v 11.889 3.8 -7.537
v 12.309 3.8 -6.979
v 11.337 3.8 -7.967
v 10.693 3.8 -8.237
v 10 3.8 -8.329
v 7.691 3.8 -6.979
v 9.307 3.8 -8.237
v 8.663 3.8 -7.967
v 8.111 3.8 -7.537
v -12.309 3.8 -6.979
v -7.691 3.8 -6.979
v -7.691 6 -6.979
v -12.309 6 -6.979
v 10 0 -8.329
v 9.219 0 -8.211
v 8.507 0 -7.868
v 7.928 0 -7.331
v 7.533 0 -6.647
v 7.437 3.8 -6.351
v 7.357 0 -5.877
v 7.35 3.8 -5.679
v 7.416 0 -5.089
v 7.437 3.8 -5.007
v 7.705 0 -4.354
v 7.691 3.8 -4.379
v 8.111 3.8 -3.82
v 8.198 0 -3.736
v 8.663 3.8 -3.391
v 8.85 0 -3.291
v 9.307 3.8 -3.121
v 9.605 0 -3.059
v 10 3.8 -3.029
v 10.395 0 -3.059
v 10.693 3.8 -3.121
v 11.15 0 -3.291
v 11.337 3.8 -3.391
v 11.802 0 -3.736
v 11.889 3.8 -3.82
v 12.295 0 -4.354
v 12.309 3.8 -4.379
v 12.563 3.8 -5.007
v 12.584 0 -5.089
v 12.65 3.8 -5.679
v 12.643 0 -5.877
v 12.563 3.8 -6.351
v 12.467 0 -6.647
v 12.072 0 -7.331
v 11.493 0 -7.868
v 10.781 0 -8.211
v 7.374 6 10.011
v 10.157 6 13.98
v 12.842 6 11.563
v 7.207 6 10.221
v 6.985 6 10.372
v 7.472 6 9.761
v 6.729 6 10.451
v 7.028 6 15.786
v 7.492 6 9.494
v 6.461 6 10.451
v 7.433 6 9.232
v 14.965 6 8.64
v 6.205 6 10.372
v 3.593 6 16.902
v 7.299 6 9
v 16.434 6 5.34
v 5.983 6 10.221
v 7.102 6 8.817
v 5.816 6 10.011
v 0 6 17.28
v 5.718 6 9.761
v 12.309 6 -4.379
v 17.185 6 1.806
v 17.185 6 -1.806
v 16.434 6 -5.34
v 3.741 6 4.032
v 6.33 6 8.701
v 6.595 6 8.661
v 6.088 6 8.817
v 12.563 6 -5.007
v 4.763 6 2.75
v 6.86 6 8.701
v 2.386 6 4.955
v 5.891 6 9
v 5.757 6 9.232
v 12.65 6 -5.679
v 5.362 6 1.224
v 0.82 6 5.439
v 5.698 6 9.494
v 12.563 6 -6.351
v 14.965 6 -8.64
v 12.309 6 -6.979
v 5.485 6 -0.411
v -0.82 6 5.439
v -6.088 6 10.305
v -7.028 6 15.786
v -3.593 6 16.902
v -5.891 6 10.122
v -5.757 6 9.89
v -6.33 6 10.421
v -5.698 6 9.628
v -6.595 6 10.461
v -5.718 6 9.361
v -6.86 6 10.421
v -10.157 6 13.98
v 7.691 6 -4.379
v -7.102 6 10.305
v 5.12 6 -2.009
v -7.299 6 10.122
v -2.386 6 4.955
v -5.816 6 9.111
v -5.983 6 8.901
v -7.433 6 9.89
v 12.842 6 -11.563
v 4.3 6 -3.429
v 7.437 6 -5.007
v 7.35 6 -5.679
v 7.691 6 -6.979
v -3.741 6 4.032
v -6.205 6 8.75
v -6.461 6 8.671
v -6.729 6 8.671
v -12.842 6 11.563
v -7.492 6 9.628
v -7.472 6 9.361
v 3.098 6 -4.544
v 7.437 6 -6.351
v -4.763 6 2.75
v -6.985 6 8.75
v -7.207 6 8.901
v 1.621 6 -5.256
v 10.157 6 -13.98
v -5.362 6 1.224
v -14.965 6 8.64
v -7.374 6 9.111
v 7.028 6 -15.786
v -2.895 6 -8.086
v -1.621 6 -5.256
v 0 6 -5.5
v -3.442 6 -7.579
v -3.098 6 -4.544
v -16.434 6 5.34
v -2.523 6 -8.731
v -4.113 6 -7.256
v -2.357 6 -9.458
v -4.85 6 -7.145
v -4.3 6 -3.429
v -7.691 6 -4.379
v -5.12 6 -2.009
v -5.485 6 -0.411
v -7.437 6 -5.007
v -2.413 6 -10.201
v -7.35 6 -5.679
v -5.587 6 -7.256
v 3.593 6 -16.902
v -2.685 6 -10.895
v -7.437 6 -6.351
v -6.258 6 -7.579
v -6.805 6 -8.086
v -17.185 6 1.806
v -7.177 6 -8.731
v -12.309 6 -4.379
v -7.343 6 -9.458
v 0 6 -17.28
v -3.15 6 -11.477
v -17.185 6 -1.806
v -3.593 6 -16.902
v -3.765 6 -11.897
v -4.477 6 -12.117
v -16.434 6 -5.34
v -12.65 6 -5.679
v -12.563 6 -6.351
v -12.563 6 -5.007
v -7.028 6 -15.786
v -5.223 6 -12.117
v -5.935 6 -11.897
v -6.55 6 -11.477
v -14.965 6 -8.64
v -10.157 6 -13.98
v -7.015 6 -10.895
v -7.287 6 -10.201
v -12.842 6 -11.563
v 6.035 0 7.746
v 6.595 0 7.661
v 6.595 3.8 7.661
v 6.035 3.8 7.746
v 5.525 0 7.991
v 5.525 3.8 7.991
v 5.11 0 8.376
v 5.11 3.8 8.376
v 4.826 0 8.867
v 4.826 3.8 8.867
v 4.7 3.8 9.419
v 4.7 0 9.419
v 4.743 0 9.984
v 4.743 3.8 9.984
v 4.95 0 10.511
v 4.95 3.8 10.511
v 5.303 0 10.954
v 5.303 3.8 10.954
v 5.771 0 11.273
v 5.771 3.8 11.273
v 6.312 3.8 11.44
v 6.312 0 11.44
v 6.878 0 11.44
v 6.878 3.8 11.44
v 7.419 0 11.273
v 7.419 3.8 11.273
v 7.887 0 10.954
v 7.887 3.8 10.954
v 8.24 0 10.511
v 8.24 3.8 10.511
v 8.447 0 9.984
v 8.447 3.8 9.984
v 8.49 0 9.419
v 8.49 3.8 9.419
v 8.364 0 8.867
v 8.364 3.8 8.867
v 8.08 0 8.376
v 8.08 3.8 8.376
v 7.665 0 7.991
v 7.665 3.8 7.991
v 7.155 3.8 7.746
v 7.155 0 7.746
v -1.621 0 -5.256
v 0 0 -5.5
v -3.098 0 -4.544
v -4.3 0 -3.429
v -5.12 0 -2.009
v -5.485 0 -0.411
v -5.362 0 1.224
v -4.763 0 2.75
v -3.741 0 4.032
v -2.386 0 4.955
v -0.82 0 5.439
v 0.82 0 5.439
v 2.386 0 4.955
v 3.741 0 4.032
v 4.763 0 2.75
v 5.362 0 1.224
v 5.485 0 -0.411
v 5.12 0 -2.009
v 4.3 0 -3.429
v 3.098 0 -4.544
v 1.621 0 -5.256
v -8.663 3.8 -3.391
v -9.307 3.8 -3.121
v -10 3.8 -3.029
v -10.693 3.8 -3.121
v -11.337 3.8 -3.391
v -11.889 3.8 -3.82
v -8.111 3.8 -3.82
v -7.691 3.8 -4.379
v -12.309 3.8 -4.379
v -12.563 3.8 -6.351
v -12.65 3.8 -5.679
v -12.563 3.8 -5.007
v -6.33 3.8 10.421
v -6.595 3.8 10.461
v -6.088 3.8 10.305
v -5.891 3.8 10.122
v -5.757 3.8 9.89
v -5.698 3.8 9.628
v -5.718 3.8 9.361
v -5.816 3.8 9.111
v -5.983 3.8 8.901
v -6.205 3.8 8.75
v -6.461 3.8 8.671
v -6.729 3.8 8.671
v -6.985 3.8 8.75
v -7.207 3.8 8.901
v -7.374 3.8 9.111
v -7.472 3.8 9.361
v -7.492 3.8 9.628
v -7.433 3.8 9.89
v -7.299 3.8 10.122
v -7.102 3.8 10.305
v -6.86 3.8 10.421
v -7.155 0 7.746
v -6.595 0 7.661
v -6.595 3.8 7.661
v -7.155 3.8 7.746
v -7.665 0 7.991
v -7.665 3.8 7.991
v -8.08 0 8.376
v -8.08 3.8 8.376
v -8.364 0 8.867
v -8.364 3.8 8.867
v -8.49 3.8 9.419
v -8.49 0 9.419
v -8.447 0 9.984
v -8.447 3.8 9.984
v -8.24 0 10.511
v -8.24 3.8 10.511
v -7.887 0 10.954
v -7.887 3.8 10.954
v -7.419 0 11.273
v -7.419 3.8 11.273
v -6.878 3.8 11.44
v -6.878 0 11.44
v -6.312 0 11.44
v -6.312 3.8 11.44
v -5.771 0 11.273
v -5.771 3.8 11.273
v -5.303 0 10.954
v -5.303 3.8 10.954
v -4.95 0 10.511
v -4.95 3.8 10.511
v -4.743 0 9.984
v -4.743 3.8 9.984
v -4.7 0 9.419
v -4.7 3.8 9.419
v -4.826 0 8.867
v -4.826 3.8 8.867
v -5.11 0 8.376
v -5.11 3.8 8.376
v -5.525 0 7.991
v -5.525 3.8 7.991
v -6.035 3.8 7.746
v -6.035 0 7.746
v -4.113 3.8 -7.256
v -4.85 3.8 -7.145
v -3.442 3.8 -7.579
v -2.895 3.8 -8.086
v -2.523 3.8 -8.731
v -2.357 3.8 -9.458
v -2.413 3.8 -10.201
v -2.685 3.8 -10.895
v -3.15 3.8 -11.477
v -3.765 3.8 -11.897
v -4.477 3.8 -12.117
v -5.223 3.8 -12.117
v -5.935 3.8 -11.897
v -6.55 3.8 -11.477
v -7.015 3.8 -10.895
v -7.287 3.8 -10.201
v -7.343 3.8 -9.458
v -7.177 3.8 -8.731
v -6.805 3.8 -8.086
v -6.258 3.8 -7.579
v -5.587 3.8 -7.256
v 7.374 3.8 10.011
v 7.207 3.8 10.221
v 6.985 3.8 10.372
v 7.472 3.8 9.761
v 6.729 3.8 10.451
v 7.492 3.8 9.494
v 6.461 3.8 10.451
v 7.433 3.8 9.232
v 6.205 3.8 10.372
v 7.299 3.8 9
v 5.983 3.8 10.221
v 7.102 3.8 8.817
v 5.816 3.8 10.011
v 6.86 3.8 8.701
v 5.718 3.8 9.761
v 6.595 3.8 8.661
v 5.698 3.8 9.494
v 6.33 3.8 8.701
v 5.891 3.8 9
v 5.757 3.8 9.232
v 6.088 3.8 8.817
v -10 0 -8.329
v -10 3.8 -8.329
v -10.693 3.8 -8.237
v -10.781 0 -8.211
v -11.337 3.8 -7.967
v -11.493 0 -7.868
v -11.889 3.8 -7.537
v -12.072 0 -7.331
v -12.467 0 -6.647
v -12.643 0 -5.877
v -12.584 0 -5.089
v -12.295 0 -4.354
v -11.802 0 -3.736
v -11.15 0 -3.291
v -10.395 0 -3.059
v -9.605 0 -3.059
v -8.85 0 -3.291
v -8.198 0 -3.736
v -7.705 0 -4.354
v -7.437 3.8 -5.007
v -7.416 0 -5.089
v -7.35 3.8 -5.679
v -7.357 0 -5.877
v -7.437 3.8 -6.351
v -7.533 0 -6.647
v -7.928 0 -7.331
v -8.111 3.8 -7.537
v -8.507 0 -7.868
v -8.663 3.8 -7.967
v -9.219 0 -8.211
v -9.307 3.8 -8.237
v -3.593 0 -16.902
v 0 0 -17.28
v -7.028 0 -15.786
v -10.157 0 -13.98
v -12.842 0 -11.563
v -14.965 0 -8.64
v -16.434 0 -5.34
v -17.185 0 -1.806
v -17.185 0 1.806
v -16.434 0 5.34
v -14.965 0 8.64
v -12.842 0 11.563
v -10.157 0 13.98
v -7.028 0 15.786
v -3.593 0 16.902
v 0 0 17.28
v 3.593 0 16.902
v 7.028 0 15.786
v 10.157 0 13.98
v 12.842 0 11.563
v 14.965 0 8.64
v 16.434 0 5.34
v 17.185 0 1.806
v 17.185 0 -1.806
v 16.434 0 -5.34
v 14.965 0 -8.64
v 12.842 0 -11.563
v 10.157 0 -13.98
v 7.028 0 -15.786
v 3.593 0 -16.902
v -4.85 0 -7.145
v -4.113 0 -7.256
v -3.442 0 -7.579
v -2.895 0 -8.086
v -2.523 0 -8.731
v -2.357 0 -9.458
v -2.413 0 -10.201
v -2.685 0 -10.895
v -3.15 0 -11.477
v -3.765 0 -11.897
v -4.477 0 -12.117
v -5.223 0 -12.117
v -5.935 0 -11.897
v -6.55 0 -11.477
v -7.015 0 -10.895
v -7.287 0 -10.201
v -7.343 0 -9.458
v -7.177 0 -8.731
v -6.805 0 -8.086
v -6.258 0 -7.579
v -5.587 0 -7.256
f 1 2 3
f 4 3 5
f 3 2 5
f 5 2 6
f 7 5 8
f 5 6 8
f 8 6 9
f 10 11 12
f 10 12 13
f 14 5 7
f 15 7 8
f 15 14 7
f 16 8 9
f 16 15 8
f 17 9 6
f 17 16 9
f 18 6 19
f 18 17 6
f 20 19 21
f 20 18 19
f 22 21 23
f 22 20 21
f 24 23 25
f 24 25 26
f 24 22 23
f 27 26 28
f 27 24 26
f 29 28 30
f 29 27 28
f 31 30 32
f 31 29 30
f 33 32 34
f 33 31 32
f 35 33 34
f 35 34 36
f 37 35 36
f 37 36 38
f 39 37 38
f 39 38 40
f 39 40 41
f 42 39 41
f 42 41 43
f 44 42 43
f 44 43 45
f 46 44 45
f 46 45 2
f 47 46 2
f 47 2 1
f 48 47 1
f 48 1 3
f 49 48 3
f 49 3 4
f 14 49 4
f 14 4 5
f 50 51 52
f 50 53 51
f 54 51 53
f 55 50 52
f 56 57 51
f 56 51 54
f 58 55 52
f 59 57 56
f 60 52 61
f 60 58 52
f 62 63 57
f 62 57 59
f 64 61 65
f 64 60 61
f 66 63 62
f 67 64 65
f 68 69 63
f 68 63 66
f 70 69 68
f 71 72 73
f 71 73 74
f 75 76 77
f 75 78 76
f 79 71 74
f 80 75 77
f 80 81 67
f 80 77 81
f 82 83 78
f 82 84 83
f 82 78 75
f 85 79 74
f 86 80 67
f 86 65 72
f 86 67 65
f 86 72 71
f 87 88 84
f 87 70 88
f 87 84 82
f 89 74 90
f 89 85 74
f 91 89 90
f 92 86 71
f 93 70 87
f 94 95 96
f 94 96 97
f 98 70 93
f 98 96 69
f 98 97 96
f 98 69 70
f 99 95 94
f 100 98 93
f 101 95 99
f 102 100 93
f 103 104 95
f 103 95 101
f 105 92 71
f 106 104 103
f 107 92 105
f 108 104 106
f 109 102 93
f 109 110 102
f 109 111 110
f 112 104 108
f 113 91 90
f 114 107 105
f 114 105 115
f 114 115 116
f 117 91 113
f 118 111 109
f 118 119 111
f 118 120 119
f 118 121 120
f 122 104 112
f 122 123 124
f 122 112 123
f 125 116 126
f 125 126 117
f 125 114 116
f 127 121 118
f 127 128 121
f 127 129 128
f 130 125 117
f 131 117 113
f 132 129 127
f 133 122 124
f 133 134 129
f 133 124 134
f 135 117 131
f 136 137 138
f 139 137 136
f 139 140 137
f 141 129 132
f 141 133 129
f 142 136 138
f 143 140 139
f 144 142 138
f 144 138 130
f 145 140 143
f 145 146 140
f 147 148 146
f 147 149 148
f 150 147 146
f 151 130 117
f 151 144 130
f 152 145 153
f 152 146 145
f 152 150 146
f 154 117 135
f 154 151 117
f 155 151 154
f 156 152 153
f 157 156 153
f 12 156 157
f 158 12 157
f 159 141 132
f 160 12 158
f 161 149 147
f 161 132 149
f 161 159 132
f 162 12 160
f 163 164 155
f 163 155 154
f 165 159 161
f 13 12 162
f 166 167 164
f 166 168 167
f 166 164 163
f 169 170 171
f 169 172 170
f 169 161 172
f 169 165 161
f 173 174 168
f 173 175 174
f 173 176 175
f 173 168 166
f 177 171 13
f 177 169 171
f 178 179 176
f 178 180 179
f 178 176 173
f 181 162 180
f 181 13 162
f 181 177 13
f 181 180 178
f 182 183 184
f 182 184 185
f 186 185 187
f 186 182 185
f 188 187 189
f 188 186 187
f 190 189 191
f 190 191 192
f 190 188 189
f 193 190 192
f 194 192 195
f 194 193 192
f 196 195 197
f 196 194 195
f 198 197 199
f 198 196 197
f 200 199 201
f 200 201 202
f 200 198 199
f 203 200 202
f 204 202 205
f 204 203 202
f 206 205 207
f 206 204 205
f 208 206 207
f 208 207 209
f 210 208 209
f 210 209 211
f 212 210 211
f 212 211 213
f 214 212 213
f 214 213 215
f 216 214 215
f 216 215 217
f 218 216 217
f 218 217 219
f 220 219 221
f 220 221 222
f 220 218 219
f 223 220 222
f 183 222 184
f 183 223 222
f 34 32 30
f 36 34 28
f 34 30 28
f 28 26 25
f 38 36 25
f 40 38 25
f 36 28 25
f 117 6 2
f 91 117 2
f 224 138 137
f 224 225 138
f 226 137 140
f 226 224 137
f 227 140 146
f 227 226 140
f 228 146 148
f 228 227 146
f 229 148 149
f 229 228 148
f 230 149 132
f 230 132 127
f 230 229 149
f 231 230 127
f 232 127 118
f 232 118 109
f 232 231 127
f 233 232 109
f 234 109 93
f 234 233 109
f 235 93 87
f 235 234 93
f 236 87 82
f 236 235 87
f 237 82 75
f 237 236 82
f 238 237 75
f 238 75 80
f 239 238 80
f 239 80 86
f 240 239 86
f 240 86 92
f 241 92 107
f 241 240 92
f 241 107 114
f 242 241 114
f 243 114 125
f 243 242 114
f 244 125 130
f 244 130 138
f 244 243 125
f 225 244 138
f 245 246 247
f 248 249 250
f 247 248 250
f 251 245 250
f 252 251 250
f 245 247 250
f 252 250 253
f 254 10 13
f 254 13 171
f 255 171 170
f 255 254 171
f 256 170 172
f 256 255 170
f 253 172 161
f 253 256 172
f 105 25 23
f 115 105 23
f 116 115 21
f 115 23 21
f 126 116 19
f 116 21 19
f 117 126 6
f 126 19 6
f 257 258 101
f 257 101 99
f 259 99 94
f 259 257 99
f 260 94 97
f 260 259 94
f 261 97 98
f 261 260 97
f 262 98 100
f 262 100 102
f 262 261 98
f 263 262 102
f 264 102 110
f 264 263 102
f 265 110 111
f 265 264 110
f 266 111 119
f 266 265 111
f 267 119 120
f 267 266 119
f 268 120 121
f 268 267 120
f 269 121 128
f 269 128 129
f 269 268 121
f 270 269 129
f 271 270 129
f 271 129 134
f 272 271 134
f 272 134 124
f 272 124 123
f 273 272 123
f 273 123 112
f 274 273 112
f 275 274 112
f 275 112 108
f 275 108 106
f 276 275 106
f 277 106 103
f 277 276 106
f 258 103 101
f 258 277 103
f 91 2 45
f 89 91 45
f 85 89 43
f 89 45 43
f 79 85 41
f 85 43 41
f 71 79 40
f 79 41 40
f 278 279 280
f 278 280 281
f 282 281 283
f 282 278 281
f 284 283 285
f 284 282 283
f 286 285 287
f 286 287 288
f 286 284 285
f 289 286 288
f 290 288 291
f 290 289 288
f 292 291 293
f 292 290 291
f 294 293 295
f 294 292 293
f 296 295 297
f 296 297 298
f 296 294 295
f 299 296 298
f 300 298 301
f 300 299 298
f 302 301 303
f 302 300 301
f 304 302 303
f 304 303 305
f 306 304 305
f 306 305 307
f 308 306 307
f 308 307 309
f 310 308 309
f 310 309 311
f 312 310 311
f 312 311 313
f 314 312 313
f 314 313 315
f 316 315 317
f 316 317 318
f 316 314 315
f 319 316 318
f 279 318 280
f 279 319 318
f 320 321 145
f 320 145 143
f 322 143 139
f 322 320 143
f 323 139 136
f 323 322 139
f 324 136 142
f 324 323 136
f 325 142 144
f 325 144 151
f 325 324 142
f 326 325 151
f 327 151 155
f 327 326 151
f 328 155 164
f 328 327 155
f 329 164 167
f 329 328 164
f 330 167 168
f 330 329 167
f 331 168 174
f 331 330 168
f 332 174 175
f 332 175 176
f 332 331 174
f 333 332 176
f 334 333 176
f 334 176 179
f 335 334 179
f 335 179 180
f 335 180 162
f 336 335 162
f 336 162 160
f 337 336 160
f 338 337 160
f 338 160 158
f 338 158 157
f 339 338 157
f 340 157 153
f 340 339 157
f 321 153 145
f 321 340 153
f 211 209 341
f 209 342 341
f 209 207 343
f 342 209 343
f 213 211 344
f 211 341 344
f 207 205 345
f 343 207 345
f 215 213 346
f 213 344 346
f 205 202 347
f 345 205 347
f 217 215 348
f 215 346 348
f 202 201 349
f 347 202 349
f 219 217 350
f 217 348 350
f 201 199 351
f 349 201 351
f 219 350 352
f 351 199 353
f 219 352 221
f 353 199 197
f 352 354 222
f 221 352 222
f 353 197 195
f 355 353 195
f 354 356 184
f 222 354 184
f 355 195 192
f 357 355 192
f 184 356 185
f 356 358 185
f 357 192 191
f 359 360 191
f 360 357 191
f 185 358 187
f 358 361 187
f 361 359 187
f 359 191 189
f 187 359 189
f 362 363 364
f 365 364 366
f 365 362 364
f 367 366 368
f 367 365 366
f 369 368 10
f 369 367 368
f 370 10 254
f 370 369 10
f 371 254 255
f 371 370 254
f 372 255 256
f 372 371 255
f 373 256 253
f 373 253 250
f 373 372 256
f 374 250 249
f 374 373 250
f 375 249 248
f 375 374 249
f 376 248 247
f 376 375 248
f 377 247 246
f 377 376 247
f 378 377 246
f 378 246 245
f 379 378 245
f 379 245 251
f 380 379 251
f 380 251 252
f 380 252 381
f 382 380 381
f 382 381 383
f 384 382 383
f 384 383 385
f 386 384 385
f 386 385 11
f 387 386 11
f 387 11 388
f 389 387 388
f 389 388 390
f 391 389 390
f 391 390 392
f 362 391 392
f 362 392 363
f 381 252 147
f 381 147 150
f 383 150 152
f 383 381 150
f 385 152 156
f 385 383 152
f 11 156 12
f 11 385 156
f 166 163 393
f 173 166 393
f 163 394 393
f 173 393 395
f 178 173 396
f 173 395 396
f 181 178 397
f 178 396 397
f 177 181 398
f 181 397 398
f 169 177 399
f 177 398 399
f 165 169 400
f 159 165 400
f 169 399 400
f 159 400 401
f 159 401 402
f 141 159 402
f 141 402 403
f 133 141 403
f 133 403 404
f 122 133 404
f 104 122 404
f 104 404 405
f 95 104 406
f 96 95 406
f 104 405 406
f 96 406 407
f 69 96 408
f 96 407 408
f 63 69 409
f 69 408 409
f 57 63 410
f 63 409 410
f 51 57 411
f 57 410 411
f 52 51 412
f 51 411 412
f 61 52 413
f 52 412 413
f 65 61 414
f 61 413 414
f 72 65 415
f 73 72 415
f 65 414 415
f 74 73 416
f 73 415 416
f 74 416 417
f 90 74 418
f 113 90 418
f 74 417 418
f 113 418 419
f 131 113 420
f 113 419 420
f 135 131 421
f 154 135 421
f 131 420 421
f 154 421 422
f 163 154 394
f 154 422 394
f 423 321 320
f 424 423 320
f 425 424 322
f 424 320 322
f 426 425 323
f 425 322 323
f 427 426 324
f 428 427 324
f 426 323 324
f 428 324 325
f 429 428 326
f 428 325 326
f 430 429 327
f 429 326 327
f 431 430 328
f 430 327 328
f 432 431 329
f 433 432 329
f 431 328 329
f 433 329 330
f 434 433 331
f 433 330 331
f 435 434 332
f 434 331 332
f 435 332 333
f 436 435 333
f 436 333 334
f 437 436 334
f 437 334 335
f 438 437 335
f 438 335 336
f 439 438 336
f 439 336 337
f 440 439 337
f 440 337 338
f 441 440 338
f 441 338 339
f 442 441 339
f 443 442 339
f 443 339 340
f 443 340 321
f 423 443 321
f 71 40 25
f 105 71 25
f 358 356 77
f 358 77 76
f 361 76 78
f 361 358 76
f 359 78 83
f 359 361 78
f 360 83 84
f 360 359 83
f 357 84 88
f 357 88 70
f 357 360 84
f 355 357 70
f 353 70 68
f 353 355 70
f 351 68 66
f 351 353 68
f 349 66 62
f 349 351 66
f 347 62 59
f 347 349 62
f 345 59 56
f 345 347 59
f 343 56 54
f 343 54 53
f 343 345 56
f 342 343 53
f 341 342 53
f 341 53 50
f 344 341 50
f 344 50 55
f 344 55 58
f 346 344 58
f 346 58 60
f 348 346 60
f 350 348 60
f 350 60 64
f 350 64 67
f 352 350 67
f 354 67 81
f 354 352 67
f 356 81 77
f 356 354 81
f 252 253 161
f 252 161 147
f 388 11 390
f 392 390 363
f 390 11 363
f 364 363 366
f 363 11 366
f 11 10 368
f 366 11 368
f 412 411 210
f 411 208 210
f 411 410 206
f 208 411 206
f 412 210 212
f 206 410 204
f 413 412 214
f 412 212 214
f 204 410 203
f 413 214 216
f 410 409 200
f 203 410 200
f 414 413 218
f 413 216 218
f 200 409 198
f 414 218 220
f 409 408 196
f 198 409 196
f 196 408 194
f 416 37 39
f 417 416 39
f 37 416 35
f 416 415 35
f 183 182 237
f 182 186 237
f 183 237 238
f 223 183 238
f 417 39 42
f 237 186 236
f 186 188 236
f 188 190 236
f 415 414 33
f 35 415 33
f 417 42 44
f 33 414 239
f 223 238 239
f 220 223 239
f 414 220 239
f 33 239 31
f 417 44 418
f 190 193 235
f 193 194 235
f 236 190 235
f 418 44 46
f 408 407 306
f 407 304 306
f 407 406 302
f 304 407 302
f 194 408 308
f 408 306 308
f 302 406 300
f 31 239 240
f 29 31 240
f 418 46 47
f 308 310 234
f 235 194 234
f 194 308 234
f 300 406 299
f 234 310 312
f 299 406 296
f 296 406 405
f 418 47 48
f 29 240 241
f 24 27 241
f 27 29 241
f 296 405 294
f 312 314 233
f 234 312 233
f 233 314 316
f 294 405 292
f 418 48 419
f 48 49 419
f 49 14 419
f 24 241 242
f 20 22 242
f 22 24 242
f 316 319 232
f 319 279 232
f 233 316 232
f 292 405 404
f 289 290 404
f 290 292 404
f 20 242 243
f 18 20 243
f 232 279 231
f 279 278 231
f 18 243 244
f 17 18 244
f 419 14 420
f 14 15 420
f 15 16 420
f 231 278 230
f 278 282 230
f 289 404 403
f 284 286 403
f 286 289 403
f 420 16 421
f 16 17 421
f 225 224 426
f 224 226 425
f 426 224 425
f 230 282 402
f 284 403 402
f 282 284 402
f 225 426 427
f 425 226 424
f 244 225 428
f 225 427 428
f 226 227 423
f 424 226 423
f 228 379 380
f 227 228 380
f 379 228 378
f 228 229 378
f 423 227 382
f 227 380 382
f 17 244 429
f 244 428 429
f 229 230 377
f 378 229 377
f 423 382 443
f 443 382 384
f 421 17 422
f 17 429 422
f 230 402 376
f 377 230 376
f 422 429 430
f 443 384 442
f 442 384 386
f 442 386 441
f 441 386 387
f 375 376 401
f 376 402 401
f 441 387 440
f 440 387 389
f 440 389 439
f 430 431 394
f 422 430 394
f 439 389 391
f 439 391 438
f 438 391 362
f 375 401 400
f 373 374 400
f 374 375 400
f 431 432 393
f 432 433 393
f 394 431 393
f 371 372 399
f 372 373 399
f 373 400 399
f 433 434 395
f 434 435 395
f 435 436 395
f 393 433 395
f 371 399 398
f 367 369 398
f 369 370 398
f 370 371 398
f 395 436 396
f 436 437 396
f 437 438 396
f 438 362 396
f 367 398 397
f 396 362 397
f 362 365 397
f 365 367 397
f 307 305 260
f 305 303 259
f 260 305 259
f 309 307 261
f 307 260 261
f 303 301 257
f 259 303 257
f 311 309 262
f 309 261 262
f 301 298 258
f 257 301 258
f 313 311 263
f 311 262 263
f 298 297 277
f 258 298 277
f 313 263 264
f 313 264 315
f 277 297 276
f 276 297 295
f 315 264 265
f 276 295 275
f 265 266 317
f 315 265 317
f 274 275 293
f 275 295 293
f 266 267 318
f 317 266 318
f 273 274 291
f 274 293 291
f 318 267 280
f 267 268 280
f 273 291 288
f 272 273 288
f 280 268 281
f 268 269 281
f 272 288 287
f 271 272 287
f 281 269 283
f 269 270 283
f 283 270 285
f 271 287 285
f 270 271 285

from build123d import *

# Parameters (mm, degrees)
SKETCH_1_R          = 17.28
SKETCH_1_R_2        = 5.5
SKETCH_1_R_3        = 2.65
SKETCH_1_R_4        = 1.9
EXTRUDE_1_DEPTH     = 3.8
SKETCH_2_R          = 2.5
CUT_EXTRUDE_1_DEPTH = 25.731291919
SKETCH_3_R          = 17.28
SKETCH_3_R_2        = 5.5
SKETCH_3_R_3        = 2.5
SKETCH_3_R_4        = 0.9
EXTRUDE_2_DEPTH     = 2.2


with BuildPart() as part:
    # 草图1 → 凸台-拉伸1 (new body)
    with BuildSketch(Plane(origin=(0, 0, 0), x_dir=(1, 0, 0), z_dir=(0, 1, 0))):
        with Locations(Location((0, 0, 0), (0, 0, 90))):
            Circle(SKETCH_1_R)
        with Locations(Location((0, 0, 0), (0, 0, 90))):
            Circle(SKETCH_1_R_2, mode=Mode.SUBTRACT)
        with Locations(Location((-10, 5.678908346, 0), (0, 0, 90))):
            Circle(SKETCH_1_R_3, mode=Mode.SUBTRACT)
        with Locations(Location((-6.595, -9.561091654, 0), (0, 0, 90))):
            Circle(SKETCH_1_R_4, mode=Mode.SUBTRACT)
        with Locations(Location((6.595, -9.561091654, 0), (0, 0, 90))):
            Circle(SKETCH_1_R_4, mode=Mode.SUBTRACT)
        with Locations(Location((10, 5.678908346, 0), (0, 0, 90))):
            Circle(SKETCH_1_R_3, mode=Mode.SUBTRACT)
    extrude(amount=EXTRUDE_1_DEPTH)

    # 草图2 → 切除-拉伸1 (cut, through all)
    with BuildSketch(Plane(origin=(0, 3.8, 0), x_dir=(1, 0, 0), z_dir=(0, 1, 0))):
        with Locations(Location((-4.85, 9.644699566, 0), (0, 0, 270))):
            Circle(SKETCH_2_R)
    extrude(amount=-CUT_EXTRUDE_1_DEPTH, mode=Mode.SUBTRACT)

    # 草图3 → 凸台-拉伸2 (add)
    with BuildSketch(Plane(origin=(0, 3.8, 0), x_dir=(1, 0, 0), z_dir=(0, 1, 0))):
        with Locations(Location((0, 0, 0), (0, 0, 90))):
            Circle(SKETCH_3_R)
        with Locations(Location((0, 0, 0), (0, 0, 90))):
            Circle(SKETCH_3_R_2, mode=Mode.SUBTRACT)
        with Locations(Location((-4.85, 9.644699566, 0), (0, 0, 270))):
            Circle(SKETCH_3_R_3, mode=Mode.SUBTRACT)
        with Locations(Location((-6.595, -9.561091654, 0), (0, 0, 270))):
            Circle(SKETCH_3_R_4, mode=Mode.SUBTRACT)
        with Locations(Location((6.595, -9.561091654, 0), (0, 0, 90))):
            Circle(SKETCH_3_R_4, mode=Mode.SUBTRACT)
        with BuildLine():
            Line((-12.309220648, 4.378908346), (-7.690779352, 4.378908346))
            ThreePointArc((-7.690779352, 4.378908346), (-7.35, 5.678908346), (-7.690779352, 6.978908346))
            Line((-7.690779352, 6.978908346), (-12.309220648, 6.978908346))
            ThreePointArc((-12.309220648, 6.978908346), (-12.65, 5.678908346), (-12.309220648, 4.378908346))
        make_face(mode=Mode.SUBTRACT)
        with BuildLine():
            Line((12.309220648, 4.378908346), (7.690779352, 4.378908346))
            ThreePointArc((7.690779352, 4.378908346), (7.35, 5.678908346), (7.690779352, 6.978908346))
            Line((7.690779352, 6.978908346), (12.309220648, 6.978908346))
            ThreePointArc((12.309220648, 6.978908346), (12.65, 5.678908346), (12.309220648, 4.378908346))
        make_face(mode=Mode.SUBTRACT)
    extrude(amount=EXTRUDE_2_DEPTH)


solid = part.part
